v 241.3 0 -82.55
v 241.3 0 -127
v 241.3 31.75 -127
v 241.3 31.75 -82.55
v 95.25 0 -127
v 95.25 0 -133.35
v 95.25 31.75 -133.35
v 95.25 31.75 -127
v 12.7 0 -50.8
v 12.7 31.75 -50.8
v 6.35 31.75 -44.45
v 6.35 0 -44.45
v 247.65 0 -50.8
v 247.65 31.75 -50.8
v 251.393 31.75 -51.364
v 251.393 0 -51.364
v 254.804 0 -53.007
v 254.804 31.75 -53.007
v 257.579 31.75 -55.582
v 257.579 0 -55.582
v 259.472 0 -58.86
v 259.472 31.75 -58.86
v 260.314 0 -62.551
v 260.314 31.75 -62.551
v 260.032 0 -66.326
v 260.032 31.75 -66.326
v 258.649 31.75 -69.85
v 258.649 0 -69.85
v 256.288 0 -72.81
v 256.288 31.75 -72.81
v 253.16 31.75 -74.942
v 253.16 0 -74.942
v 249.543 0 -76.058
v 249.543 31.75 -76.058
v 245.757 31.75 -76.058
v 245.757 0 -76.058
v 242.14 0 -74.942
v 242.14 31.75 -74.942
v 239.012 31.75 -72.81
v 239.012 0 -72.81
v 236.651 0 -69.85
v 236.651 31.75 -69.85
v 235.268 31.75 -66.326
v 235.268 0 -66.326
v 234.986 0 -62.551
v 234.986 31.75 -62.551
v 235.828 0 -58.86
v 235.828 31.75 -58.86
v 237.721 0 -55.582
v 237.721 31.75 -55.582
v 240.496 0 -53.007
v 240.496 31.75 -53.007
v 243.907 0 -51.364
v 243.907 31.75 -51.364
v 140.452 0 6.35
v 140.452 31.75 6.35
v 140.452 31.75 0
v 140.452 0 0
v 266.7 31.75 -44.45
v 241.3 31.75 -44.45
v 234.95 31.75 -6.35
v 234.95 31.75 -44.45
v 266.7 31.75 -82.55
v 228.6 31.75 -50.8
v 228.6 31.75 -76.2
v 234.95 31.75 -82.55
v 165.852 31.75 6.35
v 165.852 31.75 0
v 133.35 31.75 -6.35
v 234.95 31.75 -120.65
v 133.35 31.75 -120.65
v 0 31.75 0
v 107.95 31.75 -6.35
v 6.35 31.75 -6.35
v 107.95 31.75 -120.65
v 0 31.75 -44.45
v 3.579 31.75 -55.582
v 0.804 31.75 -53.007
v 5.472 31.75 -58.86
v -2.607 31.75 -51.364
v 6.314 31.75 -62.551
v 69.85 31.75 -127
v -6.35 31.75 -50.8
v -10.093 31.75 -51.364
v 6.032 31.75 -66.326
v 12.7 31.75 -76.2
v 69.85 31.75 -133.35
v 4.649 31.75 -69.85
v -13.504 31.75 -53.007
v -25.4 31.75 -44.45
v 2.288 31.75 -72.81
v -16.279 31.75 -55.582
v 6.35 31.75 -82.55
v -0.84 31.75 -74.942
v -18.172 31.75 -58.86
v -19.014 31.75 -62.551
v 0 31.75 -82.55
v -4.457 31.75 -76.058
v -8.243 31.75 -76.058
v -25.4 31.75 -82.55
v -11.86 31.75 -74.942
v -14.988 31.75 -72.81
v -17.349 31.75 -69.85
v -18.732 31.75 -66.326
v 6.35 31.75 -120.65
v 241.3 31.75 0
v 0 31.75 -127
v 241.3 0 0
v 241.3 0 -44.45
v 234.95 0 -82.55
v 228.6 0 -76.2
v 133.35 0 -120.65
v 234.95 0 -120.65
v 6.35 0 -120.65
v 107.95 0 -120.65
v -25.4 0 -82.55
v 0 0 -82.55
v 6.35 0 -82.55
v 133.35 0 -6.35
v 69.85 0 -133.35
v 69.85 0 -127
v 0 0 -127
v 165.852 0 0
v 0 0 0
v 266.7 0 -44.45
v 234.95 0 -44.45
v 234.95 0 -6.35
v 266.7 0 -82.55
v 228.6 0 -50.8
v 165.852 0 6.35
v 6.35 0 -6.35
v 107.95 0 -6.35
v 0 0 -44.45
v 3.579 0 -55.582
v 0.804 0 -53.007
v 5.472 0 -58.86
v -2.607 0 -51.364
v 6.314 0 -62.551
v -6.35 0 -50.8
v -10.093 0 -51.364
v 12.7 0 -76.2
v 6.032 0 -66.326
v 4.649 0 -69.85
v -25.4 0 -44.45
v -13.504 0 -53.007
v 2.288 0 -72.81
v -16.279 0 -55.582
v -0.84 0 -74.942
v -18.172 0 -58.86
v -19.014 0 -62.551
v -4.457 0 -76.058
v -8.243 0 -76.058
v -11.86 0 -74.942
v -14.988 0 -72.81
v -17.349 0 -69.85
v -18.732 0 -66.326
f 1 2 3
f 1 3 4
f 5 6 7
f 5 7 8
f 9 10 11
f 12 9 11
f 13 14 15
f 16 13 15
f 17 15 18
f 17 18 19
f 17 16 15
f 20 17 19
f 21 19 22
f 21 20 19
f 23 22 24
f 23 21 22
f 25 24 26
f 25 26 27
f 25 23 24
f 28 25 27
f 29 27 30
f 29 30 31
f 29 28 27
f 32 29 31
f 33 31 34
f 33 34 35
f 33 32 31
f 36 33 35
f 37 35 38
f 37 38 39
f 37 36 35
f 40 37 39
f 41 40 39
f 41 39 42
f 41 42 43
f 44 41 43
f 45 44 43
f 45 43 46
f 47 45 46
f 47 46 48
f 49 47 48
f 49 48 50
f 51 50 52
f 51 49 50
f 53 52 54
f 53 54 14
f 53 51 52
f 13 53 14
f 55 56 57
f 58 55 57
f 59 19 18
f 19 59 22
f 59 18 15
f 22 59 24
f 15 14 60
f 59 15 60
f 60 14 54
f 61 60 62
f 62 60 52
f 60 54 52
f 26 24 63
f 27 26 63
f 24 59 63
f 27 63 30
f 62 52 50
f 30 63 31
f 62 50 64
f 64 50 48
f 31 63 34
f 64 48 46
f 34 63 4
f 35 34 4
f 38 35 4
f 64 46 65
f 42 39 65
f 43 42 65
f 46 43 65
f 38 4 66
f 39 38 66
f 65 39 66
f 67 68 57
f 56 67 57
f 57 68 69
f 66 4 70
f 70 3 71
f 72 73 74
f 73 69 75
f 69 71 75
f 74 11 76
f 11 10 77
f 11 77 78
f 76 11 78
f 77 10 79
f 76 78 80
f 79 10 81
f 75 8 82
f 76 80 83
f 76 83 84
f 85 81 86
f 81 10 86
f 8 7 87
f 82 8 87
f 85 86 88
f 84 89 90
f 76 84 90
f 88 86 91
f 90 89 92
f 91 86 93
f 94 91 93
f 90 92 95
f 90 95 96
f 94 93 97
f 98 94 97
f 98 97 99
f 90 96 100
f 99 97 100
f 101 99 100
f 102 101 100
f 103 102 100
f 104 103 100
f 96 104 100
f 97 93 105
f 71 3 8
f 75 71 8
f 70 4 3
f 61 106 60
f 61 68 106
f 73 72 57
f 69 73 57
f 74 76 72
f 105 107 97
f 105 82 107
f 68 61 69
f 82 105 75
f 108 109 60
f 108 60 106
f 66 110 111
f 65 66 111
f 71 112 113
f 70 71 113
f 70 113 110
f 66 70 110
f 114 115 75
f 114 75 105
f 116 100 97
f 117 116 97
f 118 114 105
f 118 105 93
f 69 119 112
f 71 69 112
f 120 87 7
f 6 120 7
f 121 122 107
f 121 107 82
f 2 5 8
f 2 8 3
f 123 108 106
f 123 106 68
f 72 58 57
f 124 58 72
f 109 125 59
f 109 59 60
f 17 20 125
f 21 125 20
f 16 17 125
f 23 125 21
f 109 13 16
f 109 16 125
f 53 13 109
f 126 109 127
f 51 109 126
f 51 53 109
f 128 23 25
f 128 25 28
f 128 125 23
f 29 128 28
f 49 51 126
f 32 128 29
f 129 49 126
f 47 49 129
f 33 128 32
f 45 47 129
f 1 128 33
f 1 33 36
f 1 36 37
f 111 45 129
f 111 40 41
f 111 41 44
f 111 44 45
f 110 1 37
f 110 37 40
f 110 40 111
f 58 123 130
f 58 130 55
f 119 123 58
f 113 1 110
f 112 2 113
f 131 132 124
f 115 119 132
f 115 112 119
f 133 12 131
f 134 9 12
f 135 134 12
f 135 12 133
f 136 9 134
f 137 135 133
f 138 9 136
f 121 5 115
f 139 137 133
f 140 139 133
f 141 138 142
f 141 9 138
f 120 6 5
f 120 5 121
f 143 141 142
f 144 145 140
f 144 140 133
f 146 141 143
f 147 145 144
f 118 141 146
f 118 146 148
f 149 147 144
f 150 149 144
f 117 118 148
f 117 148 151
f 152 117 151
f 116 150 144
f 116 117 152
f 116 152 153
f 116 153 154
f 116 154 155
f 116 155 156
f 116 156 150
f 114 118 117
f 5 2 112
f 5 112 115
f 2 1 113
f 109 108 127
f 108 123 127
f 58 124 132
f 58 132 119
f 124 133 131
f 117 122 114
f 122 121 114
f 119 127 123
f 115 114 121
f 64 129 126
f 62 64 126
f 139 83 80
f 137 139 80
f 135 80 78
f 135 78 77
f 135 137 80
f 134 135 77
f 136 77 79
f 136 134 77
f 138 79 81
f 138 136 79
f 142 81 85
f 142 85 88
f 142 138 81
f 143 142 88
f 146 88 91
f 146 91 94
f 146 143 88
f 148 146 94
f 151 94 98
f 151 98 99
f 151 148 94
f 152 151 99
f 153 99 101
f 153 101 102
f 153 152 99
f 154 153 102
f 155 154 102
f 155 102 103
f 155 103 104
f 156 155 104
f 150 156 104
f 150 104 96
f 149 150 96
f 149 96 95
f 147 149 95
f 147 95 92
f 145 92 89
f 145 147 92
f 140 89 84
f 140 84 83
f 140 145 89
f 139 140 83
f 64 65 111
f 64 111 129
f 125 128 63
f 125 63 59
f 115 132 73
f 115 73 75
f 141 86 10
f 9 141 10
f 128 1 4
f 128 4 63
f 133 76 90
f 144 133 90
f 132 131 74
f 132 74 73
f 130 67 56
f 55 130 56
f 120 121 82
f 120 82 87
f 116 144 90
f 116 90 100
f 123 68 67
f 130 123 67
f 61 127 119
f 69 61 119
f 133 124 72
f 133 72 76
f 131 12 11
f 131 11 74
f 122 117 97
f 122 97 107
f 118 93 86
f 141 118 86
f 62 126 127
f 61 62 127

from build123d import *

# Parameters (mm, degrees)
SKETCH1_R           = 12.7
BOSS_EXTRUDE2_DEPTH = 31.75


with BuildPart() as part:
    # Sketch1 → Boss-Extrude2 (new body)
    with BuildSketch(Plane(origin=(0, 0, 0), x_dir=(1, 0, 0), z_dir=(0, 1, 0))):
        Polygon((95.25, 127), (241.3, 127), (241.3, 82.55), (266.7, 82.55), (266.7, 44.45), (241.3, 44.45), (241.3, 0), (165.851748879, 0), (165.851748879, -6.35), (140.451748879, -6.35), (140.451748879, 0), (0, 0), (0, 44.45), (-25.4, 44.45), (-25.4, 82.55), (0, 82.55), (0, 127), (69.85, 127), (69.85, 133.35), (95.25, 133.35), align=None)
        with Locations(Location((247.65, 63.5, 0), (0, 0, 270))):
            Circle(SKETCH1_R, mode=Mode.SUBTRACT)
        with Locations(Location((-6.35, 63.5, 0), (0, 0, 270))):
            Circle(SKETCH1_R, mode=Mode.SUBTRACT)
        Polygon((6.35, 82.55), (12.7, 76.2), (12.7, 50.8), (6.35, 44.45), (6.35, 6.35), (107.95, 6.35), (107.95, 120.65), (6.35, 120.65), align=None, mode=Mode.SUBTRACT)
        Polygon((234.95, 82.55), (228.6, 76.2), (228.6, 50.8), (234.95, 44.45), (234.95, 6.35), (133.35, 6.35), (133.35, 120.65), (234.95, 120.65), align=None, mode=Mode.SUBTRACT)
    extrude(amount=BOSS_EXTRUDE2_DEPTH)


solid = part.part
